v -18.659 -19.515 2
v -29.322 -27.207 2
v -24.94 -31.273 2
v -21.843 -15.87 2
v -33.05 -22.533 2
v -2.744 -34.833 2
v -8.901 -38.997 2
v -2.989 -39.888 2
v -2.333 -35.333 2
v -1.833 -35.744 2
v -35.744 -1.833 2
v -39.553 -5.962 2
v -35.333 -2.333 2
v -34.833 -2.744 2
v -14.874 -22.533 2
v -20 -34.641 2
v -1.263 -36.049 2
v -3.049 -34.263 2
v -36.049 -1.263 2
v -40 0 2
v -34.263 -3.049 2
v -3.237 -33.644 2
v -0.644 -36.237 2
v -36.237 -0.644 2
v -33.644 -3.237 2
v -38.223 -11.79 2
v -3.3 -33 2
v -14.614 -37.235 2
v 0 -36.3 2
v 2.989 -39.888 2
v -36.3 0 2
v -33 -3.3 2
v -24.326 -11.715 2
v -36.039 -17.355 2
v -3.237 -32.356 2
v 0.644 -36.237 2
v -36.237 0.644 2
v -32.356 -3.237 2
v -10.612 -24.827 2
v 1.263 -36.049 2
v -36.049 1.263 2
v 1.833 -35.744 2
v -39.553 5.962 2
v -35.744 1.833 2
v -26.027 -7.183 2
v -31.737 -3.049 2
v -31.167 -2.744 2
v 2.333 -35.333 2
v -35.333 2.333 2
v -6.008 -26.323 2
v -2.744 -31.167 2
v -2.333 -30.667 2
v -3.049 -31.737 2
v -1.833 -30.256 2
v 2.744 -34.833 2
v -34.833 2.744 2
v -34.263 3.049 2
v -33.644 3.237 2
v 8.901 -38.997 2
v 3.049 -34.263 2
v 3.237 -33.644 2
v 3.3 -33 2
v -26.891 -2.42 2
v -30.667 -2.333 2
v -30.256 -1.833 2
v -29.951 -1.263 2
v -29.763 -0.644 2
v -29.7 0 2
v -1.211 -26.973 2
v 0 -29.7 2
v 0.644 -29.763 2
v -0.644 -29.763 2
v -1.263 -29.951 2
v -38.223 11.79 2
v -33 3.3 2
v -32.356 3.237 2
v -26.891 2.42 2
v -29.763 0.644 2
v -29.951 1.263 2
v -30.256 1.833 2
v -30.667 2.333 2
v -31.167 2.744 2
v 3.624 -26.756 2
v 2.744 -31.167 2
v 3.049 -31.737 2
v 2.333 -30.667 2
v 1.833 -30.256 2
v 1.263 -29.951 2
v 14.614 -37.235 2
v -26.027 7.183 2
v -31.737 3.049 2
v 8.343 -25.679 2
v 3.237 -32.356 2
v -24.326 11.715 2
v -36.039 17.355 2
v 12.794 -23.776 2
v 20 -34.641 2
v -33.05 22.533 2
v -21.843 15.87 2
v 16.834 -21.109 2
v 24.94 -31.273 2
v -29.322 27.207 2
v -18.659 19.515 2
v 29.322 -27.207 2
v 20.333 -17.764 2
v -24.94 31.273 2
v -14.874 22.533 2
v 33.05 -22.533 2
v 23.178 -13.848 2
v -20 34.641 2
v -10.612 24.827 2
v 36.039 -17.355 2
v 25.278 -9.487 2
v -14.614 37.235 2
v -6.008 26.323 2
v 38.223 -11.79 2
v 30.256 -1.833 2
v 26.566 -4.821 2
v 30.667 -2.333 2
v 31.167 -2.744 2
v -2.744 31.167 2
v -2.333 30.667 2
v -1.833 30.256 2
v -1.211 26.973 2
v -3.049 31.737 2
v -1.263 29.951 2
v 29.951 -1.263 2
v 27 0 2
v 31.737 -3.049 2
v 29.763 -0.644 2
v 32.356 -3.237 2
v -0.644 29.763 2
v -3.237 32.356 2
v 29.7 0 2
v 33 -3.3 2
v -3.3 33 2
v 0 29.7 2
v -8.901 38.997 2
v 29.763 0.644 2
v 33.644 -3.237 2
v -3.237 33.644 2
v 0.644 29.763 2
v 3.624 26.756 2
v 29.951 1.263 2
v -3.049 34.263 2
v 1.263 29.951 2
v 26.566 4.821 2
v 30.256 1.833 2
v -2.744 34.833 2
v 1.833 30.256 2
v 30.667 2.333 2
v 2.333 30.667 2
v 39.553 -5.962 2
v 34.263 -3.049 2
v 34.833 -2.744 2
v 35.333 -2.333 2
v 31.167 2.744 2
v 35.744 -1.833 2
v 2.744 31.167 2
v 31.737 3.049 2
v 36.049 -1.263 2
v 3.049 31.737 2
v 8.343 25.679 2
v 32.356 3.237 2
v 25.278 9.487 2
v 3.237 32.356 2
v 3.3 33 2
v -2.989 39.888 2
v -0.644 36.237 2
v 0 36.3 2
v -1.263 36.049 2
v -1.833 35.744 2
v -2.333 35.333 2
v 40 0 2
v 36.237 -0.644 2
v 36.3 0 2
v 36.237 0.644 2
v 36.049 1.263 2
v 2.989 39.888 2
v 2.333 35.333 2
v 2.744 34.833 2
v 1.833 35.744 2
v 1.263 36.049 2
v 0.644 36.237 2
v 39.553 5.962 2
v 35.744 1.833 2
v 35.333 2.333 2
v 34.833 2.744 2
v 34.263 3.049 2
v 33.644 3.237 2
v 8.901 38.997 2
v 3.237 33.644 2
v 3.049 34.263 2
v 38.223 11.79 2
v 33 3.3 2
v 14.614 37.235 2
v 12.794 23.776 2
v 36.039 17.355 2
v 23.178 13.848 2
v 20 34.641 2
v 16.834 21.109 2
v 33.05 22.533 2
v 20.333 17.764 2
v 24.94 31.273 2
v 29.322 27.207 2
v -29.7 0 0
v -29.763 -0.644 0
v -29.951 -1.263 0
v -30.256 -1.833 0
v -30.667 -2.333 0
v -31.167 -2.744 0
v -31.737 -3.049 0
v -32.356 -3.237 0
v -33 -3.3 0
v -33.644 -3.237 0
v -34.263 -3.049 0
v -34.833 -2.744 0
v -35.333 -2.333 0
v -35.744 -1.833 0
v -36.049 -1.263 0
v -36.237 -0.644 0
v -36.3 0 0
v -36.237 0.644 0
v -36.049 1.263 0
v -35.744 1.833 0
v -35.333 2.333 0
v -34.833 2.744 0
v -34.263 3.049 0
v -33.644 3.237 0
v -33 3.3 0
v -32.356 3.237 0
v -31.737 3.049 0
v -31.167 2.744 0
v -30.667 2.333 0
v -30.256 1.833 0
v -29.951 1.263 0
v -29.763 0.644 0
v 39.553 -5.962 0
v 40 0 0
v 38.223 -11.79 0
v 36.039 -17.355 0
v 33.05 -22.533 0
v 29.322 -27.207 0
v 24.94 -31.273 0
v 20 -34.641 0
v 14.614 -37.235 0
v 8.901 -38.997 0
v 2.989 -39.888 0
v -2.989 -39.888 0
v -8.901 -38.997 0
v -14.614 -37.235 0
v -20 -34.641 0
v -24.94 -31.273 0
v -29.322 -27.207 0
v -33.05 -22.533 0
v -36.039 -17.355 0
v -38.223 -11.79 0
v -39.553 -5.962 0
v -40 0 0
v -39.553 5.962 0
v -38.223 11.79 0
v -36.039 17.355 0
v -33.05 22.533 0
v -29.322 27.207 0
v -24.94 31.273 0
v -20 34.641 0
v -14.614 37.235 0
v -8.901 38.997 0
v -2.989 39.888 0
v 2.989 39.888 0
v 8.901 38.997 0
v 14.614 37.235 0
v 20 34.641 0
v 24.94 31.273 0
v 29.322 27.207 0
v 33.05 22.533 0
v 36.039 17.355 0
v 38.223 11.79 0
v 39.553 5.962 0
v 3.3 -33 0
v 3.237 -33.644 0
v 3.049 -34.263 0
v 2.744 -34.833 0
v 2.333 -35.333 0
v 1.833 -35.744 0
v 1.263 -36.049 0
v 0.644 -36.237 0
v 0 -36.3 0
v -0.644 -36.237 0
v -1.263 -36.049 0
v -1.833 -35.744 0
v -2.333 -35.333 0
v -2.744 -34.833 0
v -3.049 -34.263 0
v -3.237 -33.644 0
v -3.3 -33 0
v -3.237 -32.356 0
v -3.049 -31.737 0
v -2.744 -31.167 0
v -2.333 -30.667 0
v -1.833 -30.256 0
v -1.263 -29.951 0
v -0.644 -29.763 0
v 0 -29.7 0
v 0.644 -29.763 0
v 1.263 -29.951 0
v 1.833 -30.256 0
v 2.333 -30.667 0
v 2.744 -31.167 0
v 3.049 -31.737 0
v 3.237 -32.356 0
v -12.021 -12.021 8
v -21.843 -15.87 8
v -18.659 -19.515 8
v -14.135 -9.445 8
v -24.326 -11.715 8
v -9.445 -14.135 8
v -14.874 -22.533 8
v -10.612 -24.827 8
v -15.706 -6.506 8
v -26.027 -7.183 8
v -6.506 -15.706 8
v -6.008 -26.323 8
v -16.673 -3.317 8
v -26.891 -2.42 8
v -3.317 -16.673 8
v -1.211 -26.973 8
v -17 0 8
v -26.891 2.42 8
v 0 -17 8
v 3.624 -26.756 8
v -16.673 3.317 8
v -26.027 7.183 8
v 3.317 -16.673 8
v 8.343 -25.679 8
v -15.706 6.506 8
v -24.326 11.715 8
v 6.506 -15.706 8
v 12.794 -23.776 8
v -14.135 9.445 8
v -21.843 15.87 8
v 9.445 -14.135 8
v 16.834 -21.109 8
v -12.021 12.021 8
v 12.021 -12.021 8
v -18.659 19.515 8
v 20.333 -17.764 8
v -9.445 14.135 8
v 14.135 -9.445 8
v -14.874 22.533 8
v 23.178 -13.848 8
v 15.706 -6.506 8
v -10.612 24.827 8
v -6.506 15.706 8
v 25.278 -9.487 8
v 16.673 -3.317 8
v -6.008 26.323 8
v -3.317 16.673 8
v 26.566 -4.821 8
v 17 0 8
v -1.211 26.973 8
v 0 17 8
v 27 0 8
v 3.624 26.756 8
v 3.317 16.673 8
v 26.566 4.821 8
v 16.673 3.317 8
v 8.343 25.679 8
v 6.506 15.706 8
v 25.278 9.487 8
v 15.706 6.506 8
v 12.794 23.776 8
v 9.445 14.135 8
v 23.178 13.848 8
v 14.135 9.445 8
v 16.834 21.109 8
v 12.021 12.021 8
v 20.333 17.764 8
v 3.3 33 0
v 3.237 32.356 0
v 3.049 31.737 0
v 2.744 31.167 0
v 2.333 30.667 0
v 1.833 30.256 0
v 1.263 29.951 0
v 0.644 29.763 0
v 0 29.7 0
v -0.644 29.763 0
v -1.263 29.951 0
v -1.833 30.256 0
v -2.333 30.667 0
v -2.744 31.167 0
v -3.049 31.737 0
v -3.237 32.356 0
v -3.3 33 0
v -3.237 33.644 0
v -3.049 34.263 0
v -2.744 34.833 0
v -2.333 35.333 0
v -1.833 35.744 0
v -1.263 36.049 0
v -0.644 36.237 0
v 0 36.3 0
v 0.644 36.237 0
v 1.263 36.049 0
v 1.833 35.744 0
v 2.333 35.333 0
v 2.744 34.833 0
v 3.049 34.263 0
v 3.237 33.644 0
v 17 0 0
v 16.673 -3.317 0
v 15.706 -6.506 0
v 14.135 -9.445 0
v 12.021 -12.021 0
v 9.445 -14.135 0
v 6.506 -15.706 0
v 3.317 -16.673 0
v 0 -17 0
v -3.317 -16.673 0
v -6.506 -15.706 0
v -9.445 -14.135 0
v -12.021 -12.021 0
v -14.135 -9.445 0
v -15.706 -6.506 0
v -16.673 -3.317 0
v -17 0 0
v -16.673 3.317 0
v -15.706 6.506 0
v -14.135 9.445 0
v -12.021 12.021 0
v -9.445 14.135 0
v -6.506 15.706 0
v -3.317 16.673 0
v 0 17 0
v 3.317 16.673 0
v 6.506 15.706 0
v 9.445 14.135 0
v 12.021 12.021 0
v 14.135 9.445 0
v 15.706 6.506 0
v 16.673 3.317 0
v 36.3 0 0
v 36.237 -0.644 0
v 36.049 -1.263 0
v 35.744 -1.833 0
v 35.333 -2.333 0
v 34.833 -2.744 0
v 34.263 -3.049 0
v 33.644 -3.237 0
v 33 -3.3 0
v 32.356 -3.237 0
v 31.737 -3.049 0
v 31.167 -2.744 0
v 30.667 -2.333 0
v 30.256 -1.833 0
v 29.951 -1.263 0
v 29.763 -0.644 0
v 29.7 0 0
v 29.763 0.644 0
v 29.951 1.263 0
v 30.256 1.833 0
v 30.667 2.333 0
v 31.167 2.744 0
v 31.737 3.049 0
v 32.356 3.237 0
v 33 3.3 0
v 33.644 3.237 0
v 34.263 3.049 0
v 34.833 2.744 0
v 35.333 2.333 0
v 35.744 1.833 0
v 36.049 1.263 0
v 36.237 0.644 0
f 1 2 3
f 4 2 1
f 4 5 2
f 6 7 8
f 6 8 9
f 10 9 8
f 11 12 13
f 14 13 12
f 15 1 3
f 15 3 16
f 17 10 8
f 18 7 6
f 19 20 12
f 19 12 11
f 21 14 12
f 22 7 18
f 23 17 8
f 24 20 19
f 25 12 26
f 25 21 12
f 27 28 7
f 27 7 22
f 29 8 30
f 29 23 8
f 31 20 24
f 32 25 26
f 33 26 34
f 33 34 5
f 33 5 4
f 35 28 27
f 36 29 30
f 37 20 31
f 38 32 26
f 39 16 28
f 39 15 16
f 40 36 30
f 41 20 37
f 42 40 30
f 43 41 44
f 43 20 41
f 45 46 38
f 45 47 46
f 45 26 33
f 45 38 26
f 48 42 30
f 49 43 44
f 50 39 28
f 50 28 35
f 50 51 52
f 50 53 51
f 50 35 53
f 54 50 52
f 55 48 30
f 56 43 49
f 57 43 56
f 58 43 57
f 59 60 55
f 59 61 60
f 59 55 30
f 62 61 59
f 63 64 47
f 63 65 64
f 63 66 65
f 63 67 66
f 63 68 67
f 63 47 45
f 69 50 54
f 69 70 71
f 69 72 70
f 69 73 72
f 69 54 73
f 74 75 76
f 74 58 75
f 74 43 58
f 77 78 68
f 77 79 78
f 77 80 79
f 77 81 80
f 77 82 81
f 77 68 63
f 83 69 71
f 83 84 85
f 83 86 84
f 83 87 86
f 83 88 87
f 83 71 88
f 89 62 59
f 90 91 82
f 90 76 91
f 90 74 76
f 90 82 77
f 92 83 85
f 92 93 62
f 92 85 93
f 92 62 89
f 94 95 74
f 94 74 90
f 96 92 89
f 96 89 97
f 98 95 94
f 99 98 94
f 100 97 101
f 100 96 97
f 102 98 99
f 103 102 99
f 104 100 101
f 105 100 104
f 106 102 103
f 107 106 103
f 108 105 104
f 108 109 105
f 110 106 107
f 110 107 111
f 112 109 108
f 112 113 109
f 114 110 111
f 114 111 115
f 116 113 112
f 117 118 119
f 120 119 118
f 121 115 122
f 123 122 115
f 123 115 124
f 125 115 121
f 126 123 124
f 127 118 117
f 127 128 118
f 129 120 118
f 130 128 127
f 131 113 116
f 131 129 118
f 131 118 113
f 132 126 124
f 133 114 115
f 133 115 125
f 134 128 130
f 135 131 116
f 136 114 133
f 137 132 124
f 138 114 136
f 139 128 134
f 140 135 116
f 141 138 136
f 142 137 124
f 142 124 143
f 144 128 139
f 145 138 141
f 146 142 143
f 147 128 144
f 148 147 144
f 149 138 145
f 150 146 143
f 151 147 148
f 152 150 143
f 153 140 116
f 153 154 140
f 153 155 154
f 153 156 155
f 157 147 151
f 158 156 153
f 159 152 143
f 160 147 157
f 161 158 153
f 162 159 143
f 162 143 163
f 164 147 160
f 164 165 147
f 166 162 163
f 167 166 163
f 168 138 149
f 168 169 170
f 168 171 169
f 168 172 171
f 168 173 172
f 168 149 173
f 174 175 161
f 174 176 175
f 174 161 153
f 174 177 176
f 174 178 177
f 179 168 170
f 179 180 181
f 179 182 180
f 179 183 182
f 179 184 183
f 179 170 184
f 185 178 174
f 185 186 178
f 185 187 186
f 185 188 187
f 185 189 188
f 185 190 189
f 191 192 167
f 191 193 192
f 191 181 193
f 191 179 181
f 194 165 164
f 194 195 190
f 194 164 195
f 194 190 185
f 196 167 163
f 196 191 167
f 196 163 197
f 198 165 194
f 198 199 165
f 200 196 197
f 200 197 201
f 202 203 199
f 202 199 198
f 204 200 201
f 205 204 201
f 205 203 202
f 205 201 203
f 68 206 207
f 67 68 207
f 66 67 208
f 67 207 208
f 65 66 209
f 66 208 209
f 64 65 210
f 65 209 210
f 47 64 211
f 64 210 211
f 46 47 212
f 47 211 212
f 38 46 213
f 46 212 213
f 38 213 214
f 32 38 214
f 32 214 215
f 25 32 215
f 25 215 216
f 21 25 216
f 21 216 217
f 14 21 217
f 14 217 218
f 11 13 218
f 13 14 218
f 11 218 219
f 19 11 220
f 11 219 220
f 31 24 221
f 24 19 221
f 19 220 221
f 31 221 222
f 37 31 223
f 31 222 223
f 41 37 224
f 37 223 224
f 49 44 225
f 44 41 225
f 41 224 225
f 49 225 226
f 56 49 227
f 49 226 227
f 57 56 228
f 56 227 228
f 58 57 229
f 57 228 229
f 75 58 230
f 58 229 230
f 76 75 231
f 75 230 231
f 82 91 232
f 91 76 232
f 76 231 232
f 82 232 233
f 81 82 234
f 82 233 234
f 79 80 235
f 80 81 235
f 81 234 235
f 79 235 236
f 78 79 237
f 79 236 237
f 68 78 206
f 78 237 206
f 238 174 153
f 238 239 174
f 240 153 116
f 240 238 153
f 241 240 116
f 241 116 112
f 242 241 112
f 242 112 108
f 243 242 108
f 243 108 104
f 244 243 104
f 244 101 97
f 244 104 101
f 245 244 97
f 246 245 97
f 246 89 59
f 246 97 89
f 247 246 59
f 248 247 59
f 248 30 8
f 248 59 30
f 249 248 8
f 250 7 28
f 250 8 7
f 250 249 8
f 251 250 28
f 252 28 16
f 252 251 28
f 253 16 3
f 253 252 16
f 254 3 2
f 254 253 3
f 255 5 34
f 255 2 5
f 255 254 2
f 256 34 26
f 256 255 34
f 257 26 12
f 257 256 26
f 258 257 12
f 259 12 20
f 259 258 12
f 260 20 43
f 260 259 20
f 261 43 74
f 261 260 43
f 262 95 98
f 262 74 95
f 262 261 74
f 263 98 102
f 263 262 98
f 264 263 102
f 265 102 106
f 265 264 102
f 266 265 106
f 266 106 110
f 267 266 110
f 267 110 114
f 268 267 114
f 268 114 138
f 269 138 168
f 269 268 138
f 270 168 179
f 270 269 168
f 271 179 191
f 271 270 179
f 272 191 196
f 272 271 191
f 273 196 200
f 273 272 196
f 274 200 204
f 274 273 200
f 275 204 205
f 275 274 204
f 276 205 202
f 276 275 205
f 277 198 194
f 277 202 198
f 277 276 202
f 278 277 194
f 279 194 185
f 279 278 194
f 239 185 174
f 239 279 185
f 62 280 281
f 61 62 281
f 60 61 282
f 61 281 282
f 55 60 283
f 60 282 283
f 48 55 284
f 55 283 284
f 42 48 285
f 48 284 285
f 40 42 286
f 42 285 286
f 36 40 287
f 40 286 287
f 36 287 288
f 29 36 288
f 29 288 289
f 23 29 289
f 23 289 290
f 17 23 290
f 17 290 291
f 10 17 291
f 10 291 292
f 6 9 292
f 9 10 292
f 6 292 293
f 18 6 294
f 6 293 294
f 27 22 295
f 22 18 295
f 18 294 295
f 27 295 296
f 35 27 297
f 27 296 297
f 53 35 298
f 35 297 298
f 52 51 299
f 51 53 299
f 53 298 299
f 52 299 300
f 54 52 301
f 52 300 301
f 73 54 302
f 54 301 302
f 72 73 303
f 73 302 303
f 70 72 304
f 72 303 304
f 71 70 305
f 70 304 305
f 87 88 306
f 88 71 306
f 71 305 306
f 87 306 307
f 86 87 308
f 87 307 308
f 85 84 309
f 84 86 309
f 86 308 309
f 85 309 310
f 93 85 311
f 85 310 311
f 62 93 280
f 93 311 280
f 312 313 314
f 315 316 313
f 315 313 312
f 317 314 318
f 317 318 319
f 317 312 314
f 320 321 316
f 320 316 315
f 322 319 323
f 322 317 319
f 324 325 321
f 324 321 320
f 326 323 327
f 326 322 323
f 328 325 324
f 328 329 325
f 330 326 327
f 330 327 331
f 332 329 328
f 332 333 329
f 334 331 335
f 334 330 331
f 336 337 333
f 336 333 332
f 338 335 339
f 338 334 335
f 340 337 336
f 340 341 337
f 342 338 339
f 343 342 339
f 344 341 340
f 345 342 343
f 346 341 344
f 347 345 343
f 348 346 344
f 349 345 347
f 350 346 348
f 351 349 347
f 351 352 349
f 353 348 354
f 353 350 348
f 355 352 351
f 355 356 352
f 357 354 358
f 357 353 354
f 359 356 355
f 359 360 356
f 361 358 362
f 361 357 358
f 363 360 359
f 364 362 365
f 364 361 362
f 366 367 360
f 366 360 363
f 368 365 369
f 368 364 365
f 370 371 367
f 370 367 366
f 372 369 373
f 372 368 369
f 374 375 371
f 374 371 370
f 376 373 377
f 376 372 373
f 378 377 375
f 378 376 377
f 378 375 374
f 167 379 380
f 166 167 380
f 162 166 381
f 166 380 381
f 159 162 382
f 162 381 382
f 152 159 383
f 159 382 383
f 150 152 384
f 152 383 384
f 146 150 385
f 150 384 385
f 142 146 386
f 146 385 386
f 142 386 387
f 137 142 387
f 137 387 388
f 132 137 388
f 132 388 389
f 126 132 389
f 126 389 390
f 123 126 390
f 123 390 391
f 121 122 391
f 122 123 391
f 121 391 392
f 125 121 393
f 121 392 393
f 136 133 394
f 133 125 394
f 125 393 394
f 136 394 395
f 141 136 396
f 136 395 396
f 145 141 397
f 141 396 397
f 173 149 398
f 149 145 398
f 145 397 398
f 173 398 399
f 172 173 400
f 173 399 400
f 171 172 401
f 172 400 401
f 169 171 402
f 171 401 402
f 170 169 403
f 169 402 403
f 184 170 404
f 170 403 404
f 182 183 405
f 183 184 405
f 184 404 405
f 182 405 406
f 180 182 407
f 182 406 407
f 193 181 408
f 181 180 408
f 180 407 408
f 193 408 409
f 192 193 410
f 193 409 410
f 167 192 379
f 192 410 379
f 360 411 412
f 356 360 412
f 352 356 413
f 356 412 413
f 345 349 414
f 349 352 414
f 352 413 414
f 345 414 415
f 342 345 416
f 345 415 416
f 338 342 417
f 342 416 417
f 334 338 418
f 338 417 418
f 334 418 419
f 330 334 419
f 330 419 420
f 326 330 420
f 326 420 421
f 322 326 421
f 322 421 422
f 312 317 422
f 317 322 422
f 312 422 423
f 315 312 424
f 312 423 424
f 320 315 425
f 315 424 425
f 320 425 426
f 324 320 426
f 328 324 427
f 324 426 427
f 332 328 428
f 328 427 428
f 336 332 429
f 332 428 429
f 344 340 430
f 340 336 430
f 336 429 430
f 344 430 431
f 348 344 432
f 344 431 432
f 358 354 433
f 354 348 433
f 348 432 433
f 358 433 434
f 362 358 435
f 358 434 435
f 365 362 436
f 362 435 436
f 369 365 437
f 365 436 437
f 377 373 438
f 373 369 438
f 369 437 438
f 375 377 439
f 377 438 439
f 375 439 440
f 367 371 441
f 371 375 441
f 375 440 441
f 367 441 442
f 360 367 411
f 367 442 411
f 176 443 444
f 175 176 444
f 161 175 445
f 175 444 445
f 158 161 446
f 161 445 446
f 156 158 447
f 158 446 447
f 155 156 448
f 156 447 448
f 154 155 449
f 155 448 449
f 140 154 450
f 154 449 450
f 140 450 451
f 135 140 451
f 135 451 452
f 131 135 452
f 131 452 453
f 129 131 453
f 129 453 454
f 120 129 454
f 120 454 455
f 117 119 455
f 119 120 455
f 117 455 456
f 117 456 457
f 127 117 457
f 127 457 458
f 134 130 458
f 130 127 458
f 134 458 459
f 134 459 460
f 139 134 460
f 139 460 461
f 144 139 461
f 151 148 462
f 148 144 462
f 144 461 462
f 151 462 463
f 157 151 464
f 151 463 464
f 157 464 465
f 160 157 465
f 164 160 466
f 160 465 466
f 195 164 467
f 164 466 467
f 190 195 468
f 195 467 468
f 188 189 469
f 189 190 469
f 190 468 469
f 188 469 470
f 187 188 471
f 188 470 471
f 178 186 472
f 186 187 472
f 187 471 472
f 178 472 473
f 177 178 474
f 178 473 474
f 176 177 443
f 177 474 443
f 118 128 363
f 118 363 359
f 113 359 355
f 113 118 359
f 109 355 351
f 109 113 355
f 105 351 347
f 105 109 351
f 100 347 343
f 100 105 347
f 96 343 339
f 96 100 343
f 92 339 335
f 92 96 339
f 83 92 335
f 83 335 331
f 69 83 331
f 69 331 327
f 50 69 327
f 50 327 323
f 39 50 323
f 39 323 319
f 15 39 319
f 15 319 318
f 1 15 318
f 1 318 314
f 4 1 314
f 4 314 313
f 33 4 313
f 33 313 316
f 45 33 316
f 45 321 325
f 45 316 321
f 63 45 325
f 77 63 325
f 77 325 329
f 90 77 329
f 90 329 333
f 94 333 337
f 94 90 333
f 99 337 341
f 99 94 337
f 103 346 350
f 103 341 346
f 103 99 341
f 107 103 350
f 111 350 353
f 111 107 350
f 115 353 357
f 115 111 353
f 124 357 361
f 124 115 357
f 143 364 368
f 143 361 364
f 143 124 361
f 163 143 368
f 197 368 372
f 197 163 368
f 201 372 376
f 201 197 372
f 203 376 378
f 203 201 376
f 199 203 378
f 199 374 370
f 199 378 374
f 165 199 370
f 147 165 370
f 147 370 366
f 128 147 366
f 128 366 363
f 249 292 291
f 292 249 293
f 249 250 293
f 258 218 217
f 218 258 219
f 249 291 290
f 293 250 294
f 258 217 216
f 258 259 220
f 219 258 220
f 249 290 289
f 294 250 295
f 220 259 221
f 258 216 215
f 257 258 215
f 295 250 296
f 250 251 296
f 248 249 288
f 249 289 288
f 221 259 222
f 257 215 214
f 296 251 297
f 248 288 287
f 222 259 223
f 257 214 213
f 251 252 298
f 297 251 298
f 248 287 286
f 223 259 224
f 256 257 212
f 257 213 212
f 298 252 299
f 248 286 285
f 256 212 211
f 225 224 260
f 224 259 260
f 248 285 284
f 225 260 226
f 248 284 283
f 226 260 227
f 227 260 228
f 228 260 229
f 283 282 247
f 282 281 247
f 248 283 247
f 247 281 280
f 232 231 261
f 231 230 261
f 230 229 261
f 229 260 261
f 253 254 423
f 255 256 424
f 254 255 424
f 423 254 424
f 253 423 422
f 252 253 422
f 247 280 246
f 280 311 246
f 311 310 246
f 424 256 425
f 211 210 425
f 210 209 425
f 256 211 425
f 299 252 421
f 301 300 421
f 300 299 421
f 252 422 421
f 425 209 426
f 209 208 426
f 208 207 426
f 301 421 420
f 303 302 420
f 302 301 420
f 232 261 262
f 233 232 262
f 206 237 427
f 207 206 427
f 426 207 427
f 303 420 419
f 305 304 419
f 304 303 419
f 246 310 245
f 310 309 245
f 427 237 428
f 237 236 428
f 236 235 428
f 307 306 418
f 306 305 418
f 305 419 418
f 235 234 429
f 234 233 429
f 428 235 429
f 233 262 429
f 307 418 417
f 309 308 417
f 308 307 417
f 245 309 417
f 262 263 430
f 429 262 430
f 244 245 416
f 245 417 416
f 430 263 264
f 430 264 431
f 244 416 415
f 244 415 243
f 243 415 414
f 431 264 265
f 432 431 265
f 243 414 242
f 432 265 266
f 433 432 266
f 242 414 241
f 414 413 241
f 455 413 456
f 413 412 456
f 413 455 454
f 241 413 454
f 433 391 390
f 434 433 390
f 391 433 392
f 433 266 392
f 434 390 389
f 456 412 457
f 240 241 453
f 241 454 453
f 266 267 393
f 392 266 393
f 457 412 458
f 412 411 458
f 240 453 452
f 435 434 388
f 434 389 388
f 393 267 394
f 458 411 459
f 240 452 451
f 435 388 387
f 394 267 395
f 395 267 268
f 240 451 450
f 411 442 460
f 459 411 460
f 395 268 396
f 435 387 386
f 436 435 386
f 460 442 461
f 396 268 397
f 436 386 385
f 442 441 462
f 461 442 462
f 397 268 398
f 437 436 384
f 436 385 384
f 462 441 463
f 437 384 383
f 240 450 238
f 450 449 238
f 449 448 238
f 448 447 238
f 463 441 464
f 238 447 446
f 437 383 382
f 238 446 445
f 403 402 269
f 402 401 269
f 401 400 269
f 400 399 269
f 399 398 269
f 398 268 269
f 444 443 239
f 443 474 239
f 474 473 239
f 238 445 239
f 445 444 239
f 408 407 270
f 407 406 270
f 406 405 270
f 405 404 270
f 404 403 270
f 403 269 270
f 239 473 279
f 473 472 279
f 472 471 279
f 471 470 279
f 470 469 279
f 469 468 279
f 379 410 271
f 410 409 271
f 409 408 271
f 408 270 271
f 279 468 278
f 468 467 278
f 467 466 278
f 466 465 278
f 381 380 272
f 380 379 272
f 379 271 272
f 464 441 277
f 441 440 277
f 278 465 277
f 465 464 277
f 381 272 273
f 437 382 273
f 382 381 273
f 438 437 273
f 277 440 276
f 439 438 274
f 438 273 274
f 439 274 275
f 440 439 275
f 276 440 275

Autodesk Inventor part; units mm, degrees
ref_plane "YZ Plane" through (0, 0, 0) normal (1, 0, 0) x (0, 1, 0)
ref_plane "XZ Plane" through (0, 0, 0) normal (0, 1, 0) x (-1, 0, 0)
ref_plane "XY Plane" through (0, 0, 0) normal (0, 0, 1) x (1, 0, 0)
sketch "Sketch1" plane through (0, 0, 0) normal (0, 0, 1) x (1, 0, 0)
  circle A0 centre (0, 0) radius 40
  circle A1 centre (0, 0) radius 27
  circle A2 centre (0, 0) radius 17
  circle A3 centre (0, 33) radius 3.3
  circle A4 centre (-33, 0) radius 3.3
  circle A5 centre (0, -33) radius 3.3
  circle A6 centre (33, 0) radius 3.3
  dimension "d0" = 80
  dimension "d1" = 54
  dimension "d2" = 34
  dimension "d4" = 6.6
  dimension "d5" = 6.6
  dimension "d6" = 6.6
  dimension "d7" = 6.6
extrude "Extrusion1" add sketch "Sketch1" along normal blind 2 contours A0
extrude "Extrusion2" add sketch "Sketch1" along normal blind 8 contours A1
properties part number "tensorpolea"
